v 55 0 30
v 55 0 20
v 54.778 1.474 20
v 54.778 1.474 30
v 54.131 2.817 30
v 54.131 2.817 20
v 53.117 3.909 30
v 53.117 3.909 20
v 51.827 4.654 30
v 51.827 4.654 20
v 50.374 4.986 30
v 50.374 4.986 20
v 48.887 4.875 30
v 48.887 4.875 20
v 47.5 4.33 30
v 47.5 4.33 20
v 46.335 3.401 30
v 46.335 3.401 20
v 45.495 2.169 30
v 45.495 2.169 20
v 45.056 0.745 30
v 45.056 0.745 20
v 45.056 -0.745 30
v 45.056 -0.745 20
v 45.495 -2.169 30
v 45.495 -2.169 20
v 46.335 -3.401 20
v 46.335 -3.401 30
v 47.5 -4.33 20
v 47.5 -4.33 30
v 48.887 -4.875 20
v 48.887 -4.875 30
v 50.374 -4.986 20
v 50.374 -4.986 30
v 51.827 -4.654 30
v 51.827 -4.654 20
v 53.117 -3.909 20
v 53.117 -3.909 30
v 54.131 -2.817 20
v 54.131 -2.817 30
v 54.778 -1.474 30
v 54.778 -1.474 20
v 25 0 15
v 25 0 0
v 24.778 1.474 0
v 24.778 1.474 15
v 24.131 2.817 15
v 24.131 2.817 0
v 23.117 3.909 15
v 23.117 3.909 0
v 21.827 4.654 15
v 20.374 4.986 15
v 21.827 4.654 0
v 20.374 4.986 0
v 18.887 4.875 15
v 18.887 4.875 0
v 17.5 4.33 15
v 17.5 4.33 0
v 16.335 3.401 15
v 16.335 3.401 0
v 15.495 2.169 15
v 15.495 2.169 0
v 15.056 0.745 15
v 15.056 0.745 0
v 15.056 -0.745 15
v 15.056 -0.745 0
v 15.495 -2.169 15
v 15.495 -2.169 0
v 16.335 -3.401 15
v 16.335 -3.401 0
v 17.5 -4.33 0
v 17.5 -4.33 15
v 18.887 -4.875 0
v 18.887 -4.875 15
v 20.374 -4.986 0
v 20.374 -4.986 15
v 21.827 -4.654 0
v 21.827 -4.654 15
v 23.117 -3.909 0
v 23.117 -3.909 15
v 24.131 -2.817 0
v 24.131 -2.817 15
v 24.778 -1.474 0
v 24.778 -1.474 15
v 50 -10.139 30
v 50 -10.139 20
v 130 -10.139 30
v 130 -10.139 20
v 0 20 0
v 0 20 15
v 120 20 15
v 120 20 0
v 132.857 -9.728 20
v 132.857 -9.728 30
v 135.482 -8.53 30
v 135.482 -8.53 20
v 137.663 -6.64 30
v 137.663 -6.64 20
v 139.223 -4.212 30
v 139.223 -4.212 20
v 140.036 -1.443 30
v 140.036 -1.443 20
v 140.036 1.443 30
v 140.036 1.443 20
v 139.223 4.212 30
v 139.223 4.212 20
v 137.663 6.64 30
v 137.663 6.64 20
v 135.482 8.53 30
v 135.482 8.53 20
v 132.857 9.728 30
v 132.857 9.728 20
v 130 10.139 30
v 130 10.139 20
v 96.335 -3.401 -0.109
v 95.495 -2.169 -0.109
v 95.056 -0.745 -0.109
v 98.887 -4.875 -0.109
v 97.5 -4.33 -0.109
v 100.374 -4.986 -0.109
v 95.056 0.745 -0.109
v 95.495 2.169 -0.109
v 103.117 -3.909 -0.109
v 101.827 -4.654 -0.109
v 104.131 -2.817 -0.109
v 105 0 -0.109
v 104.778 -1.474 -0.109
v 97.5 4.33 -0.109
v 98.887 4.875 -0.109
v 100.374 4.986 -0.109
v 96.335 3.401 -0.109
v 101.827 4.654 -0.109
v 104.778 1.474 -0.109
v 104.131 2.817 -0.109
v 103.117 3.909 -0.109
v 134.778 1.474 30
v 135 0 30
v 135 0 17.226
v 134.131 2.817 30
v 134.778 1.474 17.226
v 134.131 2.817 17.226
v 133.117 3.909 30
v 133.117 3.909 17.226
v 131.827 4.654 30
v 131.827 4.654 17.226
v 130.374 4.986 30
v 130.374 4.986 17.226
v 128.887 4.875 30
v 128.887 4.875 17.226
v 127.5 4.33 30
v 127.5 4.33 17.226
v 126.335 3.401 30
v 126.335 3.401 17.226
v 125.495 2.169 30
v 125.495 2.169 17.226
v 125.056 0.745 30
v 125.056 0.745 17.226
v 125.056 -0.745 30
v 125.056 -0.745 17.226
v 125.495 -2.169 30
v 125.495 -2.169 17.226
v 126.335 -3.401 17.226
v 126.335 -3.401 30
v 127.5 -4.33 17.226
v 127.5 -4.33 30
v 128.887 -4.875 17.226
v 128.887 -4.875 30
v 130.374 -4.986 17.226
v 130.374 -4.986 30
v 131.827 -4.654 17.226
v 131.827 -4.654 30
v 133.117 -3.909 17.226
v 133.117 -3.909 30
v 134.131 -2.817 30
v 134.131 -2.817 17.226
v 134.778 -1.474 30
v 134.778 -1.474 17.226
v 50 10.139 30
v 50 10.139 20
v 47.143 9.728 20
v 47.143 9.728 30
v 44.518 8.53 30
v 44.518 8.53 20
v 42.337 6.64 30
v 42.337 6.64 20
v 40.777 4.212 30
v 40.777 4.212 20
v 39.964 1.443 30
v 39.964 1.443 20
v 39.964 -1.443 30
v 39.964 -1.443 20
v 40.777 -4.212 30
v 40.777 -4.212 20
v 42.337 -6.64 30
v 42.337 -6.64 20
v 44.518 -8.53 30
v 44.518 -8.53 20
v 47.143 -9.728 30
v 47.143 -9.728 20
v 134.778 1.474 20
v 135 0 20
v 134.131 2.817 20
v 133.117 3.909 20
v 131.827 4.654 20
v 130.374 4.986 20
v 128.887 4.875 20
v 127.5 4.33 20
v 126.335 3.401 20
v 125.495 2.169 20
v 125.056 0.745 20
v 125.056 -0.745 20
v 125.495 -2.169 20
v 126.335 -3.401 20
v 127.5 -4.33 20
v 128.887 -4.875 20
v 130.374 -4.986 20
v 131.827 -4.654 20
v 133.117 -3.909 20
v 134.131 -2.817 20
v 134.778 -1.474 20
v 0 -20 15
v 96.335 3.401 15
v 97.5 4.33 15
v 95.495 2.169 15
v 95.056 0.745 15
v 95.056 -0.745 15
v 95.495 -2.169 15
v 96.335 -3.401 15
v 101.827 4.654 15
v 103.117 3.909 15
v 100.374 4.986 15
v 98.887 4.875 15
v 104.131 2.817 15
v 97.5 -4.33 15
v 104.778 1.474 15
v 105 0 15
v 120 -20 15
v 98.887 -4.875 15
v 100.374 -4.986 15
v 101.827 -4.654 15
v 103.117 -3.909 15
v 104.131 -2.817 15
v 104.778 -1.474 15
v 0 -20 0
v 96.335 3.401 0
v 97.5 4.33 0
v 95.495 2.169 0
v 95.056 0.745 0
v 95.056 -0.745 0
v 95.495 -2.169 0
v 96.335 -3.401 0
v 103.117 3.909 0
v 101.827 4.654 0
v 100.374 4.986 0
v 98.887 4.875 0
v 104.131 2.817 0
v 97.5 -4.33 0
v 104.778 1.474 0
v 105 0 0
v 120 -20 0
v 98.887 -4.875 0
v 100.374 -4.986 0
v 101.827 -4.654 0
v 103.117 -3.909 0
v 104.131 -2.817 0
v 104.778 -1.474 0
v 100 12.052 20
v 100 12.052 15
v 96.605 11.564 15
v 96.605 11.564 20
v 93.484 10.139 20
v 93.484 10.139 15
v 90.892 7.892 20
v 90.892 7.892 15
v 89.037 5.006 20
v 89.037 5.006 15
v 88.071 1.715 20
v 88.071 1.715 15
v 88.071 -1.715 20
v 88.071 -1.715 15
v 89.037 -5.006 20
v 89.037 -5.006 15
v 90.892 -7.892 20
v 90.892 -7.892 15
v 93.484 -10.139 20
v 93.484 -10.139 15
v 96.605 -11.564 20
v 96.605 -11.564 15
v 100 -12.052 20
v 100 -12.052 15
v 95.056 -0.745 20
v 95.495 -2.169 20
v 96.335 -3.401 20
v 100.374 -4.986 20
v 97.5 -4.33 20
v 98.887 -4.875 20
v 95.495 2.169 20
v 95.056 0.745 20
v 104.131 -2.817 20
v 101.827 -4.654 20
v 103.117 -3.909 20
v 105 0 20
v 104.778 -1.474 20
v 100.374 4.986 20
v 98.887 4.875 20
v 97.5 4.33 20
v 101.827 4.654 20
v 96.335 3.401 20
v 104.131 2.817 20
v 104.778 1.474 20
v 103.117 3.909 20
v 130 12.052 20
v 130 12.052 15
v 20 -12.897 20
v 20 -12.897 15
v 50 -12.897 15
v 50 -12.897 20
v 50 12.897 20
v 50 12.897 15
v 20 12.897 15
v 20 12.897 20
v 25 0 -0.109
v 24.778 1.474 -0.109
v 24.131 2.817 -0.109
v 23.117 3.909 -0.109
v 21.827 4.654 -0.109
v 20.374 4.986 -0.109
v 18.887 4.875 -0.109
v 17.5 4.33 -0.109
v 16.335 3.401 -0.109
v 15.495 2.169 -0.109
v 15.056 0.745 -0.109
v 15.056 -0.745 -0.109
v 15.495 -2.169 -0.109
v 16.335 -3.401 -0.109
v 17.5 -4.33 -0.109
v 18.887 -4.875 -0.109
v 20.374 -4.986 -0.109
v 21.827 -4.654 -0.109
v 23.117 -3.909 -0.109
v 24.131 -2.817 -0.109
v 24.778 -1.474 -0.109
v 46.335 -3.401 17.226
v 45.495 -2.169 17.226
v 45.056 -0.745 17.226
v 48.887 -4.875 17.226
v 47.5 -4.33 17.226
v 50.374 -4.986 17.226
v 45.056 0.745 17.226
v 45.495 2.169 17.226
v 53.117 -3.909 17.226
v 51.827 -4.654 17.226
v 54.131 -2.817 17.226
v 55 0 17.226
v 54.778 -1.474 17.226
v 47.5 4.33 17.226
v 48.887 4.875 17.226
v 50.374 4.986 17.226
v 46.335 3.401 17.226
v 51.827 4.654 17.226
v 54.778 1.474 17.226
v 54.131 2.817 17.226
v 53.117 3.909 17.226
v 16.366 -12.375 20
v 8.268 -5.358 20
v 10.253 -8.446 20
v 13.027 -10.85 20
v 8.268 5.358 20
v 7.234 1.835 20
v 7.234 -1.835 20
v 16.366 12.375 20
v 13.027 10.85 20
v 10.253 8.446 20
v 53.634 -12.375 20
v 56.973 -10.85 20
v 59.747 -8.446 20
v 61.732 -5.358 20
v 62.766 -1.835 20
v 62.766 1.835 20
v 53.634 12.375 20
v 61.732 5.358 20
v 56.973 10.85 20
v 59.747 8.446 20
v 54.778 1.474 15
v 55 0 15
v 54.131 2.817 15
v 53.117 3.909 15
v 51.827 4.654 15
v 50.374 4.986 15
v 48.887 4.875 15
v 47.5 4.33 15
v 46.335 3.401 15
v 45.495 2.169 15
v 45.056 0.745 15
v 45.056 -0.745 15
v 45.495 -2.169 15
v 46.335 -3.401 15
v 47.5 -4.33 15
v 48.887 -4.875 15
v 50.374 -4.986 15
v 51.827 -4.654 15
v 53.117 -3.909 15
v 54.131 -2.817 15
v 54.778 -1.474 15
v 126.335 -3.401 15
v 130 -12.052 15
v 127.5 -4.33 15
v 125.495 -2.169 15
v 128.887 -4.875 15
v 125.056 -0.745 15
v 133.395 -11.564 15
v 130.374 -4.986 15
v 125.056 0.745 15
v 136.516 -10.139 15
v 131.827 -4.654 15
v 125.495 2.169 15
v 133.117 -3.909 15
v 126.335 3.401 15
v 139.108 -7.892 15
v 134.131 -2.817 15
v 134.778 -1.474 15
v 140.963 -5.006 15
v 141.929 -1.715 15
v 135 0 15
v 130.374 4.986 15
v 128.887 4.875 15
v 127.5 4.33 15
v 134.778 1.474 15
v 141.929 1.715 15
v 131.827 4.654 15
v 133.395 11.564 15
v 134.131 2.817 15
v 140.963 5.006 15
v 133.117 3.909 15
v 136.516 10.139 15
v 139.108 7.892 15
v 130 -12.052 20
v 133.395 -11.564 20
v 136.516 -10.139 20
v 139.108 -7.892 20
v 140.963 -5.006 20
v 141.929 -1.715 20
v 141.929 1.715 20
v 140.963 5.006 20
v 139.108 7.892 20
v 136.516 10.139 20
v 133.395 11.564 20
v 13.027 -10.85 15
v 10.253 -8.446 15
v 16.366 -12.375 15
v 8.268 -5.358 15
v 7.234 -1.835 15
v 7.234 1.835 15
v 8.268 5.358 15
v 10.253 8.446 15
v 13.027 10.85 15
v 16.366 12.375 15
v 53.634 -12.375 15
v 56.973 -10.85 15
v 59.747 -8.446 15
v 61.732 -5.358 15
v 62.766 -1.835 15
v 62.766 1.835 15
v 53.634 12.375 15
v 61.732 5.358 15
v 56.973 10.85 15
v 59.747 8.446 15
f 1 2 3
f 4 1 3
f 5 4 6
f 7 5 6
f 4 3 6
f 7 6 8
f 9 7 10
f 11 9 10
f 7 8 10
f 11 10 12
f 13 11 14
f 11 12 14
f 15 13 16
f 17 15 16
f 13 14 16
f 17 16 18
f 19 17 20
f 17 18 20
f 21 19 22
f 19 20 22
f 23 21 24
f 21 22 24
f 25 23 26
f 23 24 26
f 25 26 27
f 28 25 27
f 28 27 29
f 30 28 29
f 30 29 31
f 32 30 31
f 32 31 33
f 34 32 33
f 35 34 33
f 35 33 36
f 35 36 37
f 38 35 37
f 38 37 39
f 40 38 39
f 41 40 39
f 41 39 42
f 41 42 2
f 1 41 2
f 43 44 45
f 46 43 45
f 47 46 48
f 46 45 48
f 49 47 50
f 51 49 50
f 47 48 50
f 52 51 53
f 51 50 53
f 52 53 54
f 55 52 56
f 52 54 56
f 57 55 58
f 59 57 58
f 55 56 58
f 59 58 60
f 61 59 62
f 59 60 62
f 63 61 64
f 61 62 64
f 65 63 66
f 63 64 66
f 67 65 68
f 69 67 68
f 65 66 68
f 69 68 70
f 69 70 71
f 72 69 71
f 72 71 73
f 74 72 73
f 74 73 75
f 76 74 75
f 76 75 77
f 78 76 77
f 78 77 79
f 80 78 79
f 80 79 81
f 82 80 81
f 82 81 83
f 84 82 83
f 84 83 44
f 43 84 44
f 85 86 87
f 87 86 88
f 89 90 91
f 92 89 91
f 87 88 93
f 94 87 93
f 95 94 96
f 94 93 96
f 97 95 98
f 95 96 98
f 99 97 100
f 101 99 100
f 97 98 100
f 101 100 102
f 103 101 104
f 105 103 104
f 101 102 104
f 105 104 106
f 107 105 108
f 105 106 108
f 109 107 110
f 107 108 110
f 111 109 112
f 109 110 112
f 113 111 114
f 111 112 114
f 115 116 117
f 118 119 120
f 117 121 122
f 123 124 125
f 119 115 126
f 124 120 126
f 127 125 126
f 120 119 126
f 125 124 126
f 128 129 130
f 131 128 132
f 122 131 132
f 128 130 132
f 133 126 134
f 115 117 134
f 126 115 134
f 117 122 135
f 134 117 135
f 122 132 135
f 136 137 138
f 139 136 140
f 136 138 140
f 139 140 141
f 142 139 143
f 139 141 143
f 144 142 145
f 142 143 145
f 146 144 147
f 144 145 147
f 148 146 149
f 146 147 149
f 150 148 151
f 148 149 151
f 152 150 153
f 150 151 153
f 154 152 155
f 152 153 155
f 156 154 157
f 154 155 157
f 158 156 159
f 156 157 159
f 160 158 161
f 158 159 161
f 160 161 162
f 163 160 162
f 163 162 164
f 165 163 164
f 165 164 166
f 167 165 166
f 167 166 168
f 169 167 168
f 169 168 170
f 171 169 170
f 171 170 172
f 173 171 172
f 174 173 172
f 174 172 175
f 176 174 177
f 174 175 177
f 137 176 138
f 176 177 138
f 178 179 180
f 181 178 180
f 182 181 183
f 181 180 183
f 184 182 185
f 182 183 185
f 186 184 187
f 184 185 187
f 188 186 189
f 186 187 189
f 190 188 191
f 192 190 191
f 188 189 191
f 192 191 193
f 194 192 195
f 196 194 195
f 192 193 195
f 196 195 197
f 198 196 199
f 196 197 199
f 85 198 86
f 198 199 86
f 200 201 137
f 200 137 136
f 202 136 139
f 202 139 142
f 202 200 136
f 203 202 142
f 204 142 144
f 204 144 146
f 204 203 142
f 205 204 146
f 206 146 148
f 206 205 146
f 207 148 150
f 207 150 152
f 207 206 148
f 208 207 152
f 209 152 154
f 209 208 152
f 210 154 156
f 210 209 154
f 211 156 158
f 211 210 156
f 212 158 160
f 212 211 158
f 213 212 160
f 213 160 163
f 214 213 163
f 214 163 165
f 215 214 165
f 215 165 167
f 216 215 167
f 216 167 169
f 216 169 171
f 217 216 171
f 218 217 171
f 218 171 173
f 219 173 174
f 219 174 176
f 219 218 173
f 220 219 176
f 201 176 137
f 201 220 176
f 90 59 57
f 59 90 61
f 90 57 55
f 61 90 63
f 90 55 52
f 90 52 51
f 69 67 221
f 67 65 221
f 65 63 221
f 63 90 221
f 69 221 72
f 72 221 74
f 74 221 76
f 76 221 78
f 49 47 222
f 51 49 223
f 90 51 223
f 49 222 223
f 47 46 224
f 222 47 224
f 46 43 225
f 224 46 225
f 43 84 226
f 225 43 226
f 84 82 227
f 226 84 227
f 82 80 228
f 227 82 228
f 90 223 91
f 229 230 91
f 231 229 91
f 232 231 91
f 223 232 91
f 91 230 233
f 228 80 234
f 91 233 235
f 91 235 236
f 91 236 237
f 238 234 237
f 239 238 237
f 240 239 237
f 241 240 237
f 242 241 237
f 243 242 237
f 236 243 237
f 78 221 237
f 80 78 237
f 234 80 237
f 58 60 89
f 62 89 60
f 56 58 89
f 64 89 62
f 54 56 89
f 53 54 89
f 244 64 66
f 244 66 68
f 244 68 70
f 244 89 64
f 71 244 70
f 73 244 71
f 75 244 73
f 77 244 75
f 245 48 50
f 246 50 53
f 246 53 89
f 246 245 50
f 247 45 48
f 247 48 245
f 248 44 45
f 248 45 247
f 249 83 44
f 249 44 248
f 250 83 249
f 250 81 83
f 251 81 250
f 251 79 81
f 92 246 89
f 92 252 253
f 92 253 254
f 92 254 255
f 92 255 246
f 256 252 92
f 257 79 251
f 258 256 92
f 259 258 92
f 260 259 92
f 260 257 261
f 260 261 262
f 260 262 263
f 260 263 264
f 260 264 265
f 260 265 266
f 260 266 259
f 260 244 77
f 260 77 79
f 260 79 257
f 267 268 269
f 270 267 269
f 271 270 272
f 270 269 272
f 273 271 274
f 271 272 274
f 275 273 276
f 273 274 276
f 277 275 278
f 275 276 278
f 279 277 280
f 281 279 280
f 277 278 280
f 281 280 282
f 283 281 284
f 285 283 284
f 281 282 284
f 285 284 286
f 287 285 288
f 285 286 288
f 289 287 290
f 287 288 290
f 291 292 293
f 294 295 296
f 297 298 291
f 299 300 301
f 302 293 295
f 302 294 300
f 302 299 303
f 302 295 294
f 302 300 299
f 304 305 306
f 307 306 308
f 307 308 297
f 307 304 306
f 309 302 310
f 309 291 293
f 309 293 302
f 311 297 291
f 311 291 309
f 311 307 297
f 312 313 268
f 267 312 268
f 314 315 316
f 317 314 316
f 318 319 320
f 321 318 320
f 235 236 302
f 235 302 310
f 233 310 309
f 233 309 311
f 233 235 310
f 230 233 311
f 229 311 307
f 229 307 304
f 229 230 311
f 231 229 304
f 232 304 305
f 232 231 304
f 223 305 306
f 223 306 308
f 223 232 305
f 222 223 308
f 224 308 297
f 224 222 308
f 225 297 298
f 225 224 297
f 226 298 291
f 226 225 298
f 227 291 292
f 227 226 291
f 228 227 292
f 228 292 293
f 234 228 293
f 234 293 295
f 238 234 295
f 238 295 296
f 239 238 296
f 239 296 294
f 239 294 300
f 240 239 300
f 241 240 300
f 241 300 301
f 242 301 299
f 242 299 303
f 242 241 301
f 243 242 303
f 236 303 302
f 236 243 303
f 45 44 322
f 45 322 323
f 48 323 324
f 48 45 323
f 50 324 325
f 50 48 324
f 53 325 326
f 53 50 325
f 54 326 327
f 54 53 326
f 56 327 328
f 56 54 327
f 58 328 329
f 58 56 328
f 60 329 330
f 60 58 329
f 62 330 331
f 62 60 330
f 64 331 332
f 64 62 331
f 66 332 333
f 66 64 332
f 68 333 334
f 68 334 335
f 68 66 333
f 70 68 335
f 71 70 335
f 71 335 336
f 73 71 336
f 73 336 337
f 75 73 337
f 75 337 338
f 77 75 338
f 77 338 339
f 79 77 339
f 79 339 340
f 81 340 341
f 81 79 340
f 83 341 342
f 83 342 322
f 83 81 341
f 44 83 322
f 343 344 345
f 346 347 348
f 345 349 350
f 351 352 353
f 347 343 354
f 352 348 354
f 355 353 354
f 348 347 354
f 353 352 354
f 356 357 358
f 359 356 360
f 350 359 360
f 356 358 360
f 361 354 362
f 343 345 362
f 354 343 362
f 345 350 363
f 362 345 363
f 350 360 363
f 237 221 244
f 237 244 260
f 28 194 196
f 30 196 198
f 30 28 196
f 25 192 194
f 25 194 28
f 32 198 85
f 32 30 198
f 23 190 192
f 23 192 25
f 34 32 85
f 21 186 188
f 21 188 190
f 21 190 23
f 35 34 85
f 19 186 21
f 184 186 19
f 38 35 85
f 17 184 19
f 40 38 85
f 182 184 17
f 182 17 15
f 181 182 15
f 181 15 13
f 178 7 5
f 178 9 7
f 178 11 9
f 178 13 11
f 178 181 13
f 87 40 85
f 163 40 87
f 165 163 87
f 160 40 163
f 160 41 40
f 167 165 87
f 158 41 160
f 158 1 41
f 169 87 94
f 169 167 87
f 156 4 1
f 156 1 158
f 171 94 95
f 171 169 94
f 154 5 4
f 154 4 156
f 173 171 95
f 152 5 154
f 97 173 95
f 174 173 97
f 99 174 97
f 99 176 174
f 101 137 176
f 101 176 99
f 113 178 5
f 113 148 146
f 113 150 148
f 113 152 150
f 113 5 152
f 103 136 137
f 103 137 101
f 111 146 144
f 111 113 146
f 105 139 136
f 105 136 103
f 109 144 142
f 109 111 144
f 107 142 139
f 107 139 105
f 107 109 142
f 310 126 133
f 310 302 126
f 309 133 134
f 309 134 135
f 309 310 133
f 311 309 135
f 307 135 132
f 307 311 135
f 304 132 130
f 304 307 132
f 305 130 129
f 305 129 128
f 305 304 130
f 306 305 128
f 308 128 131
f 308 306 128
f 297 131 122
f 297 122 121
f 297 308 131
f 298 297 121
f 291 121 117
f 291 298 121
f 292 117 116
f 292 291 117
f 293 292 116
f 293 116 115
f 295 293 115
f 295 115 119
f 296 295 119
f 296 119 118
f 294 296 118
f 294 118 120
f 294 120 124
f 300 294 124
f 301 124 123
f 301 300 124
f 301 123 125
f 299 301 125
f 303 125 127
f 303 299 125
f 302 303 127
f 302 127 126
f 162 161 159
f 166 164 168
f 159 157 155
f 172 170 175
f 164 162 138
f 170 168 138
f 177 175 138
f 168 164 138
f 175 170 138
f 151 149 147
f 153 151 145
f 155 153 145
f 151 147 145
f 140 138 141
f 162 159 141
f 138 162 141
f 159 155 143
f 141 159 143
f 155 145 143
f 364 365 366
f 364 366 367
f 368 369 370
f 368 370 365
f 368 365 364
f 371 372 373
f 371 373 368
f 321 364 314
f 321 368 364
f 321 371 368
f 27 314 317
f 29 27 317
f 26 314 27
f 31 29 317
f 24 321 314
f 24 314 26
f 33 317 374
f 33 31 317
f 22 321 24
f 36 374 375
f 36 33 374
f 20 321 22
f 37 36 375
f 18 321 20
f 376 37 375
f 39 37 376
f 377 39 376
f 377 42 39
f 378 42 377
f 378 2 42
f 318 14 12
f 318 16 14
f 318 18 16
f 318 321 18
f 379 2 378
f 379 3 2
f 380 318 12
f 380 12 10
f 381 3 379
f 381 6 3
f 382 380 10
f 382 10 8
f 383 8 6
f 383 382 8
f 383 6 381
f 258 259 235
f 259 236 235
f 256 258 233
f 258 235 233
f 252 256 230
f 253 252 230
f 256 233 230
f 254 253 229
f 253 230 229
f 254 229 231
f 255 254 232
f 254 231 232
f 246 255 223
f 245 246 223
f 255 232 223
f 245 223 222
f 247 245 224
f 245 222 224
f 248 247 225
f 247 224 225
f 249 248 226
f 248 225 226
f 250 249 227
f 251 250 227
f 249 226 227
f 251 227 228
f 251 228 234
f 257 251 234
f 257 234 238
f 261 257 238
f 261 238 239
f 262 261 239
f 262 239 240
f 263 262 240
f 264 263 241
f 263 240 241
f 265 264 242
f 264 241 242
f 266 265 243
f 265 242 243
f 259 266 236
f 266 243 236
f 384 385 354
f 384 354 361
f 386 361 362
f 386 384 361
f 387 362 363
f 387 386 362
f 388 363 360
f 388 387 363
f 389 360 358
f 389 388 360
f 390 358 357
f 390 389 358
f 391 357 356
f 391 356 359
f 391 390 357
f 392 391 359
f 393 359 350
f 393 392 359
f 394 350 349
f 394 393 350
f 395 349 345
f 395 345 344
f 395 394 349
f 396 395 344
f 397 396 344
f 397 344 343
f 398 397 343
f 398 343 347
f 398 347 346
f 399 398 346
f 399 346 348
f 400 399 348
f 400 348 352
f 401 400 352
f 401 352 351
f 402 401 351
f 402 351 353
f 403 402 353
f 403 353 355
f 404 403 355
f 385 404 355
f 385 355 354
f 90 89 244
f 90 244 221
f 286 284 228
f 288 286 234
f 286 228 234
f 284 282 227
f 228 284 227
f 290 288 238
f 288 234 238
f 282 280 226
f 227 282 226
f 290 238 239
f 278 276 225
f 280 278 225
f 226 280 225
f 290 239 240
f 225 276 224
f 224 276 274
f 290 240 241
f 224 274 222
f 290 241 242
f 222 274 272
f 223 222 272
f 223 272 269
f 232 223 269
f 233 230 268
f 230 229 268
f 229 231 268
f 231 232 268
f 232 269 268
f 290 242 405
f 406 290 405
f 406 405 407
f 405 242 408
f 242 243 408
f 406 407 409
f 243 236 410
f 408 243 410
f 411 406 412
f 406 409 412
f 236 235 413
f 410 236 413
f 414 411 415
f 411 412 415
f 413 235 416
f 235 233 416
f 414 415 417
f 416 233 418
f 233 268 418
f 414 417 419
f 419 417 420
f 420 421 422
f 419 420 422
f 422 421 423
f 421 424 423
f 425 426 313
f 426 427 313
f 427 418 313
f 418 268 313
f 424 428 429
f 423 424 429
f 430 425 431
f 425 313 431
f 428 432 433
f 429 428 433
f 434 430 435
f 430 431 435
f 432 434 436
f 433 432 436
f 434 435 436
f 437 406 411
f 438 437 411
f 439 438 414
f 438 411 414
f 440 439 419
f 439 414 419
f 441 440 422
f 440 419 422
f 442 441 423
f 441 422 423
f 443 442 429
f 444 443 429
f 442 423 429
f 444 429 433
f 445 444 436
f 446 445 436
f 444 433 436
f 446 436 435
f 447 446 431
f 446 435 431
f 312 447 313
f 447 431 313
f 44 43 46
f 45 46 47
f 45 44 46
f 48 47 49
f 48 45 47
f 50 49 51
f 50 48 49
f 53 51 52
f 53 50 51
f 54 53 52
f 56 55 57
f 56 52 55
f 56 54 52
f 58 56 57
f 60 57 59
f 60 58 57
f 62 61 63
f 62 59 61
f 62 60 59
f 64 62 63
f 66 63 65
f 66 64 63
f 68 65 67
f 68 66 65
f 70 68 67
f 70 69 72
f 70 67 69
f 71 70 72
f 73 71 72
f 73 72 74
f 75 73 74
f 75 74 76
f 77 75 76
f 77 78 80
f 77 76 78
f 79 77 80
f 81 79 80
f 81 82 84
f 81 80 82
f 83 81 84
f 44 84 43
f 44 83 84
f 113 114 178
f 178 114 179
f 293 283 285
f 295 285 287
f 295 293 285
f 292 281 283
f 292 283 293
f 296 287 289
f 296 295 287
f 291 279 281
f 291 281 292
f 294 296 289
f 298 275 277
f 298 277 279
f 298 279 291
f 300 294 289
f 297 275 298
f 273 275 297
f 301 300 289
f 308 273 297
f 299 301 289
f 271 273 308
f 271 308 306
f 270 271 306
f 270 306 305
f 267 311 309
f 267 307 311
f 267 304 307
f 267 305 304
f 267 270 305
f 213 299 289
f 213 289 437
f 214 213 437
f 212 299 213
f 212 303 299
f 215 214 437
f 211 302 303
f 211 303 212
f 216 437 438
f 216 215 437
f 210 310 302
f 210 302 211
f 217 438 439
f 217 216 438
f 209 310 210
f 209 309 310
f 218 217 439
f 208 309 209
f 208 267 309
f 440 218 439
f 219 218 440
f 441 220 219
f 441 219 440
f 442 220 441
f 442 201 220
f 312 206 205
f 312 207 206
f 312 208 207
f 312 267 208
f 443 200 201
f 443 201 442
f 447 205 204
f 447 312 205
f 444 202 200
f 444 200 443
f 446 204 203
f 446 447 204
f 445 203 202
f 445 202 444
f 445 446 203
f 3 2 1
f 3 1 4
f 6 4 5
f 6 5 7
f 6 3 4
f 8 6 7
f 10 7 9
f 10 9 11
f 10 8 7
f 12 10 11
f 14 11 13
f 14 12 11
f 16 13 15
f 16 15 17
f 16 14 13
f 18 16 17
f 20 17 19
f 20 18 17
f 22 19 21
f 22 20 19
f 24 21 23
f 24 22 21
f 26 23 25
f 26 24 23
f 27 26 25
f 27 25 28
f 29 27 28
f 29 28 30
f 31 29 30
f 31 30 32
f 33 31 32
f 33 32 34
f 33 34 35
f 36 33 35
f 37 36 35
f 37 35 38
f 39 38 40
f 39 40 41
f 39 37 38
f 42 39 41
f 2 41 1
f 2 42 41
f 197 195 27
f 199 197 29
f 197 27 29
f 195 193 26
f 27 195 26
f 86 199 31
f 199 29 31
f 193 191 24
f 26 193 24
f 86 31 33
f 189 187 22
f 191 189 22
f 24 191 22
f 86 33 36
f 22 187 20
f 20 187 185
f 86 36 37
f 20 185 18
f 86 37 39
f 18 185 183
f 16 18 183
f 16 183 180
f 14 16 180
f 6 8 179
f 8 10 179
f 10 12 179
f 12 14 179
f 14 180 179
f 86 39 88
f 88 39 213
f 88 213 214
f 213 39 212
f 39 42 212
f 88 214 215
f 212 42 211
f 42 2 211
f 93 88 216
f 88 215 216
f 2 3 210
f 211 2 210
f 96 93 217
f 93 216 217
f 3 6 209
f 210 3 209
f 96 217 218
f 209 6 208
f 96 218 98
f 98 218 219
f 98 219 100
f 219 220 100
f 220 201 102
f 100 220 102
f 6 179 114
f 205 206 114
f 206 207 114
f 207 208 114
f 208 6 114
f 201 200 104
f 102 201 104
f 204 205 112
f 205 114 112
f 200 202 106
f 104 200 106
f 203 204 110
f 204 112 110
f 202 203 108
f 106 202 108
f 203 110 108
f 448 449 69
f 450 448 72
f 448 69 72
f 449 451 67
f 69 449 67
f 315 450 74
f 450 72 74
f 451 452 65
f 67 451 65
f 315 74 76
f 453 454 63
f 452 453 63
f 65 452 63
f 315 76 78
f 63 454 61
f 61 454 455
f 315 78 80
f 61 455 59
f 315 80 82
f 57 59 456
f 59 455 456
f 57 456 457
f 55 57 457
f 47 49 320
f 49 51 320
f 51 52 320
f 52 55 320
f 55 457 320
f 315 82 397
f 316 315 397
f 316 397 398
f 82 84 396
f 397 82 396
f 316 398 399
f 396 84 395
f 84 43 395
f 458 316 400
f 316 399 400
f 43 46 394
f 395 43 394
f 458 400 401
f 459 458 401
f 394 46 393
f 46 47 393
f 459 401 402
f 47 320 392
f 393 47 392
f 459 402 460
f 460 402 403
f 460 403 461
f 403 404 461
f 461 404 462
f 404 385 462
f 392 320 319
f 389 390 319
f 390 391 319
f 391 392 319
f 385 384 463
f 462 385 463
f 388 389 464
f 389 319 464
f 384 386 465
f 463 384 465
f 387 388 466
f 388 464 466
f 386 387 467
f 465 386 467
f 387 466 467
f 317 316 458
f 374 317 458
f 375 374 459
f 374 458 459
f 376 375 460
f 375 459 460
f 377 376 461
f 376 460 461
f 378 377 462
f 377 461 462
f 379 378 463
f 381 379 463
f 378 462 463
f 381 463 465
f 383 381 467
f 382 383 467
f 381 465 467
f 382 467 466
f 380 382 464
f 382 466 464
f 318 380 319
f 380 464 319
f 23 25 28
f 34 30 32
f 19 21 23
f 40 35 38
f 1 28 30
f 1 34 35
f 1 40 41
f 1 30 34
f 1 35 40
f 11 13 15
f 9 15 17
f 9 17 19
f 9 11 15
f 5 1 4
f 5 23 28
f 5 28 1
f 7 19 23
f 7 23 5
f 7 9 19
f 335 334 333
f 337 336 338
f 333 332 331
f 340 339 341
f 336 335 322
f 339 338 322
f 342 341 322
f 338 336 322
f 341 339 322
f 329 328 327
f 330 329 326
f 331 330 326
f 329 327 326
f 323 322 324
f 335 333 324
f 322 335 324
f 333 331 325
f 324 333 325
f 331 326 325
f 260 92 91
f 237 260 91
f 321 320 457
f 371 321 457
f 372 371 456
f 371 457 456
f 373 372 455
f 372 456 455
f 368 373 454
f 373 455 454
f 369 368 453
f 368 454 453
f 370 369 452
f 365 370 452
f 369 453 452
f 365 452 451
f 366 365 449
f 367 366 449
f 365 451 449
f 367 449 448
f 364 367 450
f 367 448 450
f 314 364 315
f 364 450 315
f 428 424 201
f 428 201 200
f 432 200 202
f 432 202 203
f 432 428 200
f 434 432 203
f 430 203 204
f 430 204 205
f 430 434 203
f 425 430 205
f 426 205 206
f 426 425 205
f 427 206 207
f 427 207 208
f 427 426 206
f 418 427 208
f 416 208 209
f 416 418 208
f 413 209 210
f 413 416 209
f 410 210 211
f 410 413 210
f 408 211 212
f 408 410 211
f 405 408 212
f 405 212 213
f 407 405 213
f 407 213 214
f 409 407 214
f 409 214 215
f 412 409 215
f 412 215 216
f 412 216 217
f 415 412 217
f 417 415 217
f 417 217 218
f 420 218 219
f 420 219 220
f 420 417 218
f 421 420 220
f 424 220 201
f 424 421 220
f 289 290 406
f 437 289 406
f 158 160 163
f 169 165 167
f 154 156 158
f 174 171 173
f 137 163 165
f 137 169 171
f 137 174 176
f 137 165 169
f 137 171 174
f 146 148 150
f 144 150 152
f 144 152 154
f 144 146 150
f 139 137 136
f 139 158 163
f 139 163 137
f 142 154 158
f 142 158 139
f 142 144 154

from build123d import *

# Parameters (mm, degrees)
F0_W           = 120
F0_H           = 15
F1_DEPTH       = 20
F2_R           = 5
F3_DEPTH       = 50
F4_R           = 5
F5_DEPTH       = 5
F7_START       = 15
F6_R           = 5
F7_DEPTH       = 5
F9_START       = 17.22615
F8_R           = 5
F9_DEPTH       = 12.77385
F10_R          = 5
F11_DEPTH      = 20
F11_DEPTH_BACK = 0.1092
F13_START      = 20
F12_R          = 5
F13_DEPTH      = 10


with BuildPart() as f1:
    # F0 (on Front) → F1 (new body, symmetric)
    with BuildSketch(Plane.XZ):
        with Locations((60, 7.5)):
            Rectangle(F0_W, F0_H)
    extrude(amount=F1_DEPTH, both=True)

    # F2 (on Top) → F3 (cut, symmetric)
    with BuildSketch(Plane.XY):
        with Locations((20, 0)):
            Circle(F2_R)
        with Locations((100, 0)):
            Circle(F2_R)
    extrude(amount=F3_DEPTH, both=True, mode=Mode.SUBTRACT)


with BuildPart() as f5:
    # F4 (on face) → F5 (new body)
    with BuildSketch(Plane.XY.offset(15)):
        with BuildLine():
            Line((50, 12.8972270639), (20, 12.8972270639))
            ThreePointArc((20, 12.8972270639), (7.1027729361, 0), (20, -12.8972270639))
            Line((20, -12.8972270639), (50, -12.8972270639))
            ThreePointArc((50, -12.8972270639), (62.8972270639, 0), (50, 12.8972270639))
        make_face()
        with Locations((20, 0)):
            Circle(F4_R, mode=Mode.SUBTRACT)
        with Locations((50, 0)):
            Circle(F4_R, mode=Mode.SUBTRACT)
    extrude(amount=F5_DEPTH)

    # F8 (on Top) → F9 (join)
    with BuildSketch(Plane.XY.offset(F9_START)):
        with Locations((50, 0)):
            Circle(F8_R)
    extrude(amount=F9_DEPTH)

    # F10 (on Top) → F11 (join, two sides)
    with BuildSketch(Plane.XY) as f11_sk:
        with Locations((20, 0)):
            Circle(F10_R)
        with Locations((100, 0)):
            Circle(F10_R)
    extrude(amount=F11_DEPTH)
    extrude(f11_sk.sketch, amount=-F11_DEPTH_BACK)


with BuildPart() as f7:
    # F6 (on Top) → F7 (new body)
    with BuildSketch(Plane.XY.offset(F7_START)):
        with BuildLine():
            Line((130, 12.0517981091), (100, 12.0517981091))
            ThreePointArc((100, 12.0517981091), (87.9482018909, 0), (100, -12.0517981091))
            Line((100, -12.0517981091), (130, -12.0517981091))
            ThreePointArc((130, -12.0517981091), (142.0517981091, 0), (130, 12.0517981091))
        make_face()
        with Locations((100, 0)):
            Circle(F6_R, mode=Mode.SUBTRACT)
        with Locations((130, 0)):
            Circle(F6_R, mode=Mode.SUBTRACT)
    extrude(amount=F7_DEPTH)


with BuildPart() as f9:
    # F8 (on Top) → F9, piece 2 (new body)
    with BuildSketch(Plane.XY.offset(F9_START)):
        with Locations((130, 0)):
            Circle(F8_R)
    extrude(amount=F9_DEPTH)


with BuildPart() as f13:
    # F12 (on Top) → F13 (new body)
    with BuildSketch(Plane.XY.offset(F13_START)):
        with BuildLine():
            Line((130, 10.1391175894), (50, 10.1391175894))
            ThreePointArc((50, 10.1391175894), (39.8608824106, 0), (50, -10.1391175894))
            Line((50, -10.1391175894), (130, -10.1391175894))
            ThreePointArc((130, -10.1391175894), (140.1391175894, 0), (130, 10.1391175894))
        make_face()
        with Locations((50, 0)):
            Circle(F12_R, mode=Mode.SUBTRACT)
        with Locations((130, 0)):
            Circle(F12_R, mode=Mode.SUBTRACT)
    extrude(amount=F13_DEPTH)


solid = Compound([f1.part, f5.part, f7.part, f9.part, f13.part])
